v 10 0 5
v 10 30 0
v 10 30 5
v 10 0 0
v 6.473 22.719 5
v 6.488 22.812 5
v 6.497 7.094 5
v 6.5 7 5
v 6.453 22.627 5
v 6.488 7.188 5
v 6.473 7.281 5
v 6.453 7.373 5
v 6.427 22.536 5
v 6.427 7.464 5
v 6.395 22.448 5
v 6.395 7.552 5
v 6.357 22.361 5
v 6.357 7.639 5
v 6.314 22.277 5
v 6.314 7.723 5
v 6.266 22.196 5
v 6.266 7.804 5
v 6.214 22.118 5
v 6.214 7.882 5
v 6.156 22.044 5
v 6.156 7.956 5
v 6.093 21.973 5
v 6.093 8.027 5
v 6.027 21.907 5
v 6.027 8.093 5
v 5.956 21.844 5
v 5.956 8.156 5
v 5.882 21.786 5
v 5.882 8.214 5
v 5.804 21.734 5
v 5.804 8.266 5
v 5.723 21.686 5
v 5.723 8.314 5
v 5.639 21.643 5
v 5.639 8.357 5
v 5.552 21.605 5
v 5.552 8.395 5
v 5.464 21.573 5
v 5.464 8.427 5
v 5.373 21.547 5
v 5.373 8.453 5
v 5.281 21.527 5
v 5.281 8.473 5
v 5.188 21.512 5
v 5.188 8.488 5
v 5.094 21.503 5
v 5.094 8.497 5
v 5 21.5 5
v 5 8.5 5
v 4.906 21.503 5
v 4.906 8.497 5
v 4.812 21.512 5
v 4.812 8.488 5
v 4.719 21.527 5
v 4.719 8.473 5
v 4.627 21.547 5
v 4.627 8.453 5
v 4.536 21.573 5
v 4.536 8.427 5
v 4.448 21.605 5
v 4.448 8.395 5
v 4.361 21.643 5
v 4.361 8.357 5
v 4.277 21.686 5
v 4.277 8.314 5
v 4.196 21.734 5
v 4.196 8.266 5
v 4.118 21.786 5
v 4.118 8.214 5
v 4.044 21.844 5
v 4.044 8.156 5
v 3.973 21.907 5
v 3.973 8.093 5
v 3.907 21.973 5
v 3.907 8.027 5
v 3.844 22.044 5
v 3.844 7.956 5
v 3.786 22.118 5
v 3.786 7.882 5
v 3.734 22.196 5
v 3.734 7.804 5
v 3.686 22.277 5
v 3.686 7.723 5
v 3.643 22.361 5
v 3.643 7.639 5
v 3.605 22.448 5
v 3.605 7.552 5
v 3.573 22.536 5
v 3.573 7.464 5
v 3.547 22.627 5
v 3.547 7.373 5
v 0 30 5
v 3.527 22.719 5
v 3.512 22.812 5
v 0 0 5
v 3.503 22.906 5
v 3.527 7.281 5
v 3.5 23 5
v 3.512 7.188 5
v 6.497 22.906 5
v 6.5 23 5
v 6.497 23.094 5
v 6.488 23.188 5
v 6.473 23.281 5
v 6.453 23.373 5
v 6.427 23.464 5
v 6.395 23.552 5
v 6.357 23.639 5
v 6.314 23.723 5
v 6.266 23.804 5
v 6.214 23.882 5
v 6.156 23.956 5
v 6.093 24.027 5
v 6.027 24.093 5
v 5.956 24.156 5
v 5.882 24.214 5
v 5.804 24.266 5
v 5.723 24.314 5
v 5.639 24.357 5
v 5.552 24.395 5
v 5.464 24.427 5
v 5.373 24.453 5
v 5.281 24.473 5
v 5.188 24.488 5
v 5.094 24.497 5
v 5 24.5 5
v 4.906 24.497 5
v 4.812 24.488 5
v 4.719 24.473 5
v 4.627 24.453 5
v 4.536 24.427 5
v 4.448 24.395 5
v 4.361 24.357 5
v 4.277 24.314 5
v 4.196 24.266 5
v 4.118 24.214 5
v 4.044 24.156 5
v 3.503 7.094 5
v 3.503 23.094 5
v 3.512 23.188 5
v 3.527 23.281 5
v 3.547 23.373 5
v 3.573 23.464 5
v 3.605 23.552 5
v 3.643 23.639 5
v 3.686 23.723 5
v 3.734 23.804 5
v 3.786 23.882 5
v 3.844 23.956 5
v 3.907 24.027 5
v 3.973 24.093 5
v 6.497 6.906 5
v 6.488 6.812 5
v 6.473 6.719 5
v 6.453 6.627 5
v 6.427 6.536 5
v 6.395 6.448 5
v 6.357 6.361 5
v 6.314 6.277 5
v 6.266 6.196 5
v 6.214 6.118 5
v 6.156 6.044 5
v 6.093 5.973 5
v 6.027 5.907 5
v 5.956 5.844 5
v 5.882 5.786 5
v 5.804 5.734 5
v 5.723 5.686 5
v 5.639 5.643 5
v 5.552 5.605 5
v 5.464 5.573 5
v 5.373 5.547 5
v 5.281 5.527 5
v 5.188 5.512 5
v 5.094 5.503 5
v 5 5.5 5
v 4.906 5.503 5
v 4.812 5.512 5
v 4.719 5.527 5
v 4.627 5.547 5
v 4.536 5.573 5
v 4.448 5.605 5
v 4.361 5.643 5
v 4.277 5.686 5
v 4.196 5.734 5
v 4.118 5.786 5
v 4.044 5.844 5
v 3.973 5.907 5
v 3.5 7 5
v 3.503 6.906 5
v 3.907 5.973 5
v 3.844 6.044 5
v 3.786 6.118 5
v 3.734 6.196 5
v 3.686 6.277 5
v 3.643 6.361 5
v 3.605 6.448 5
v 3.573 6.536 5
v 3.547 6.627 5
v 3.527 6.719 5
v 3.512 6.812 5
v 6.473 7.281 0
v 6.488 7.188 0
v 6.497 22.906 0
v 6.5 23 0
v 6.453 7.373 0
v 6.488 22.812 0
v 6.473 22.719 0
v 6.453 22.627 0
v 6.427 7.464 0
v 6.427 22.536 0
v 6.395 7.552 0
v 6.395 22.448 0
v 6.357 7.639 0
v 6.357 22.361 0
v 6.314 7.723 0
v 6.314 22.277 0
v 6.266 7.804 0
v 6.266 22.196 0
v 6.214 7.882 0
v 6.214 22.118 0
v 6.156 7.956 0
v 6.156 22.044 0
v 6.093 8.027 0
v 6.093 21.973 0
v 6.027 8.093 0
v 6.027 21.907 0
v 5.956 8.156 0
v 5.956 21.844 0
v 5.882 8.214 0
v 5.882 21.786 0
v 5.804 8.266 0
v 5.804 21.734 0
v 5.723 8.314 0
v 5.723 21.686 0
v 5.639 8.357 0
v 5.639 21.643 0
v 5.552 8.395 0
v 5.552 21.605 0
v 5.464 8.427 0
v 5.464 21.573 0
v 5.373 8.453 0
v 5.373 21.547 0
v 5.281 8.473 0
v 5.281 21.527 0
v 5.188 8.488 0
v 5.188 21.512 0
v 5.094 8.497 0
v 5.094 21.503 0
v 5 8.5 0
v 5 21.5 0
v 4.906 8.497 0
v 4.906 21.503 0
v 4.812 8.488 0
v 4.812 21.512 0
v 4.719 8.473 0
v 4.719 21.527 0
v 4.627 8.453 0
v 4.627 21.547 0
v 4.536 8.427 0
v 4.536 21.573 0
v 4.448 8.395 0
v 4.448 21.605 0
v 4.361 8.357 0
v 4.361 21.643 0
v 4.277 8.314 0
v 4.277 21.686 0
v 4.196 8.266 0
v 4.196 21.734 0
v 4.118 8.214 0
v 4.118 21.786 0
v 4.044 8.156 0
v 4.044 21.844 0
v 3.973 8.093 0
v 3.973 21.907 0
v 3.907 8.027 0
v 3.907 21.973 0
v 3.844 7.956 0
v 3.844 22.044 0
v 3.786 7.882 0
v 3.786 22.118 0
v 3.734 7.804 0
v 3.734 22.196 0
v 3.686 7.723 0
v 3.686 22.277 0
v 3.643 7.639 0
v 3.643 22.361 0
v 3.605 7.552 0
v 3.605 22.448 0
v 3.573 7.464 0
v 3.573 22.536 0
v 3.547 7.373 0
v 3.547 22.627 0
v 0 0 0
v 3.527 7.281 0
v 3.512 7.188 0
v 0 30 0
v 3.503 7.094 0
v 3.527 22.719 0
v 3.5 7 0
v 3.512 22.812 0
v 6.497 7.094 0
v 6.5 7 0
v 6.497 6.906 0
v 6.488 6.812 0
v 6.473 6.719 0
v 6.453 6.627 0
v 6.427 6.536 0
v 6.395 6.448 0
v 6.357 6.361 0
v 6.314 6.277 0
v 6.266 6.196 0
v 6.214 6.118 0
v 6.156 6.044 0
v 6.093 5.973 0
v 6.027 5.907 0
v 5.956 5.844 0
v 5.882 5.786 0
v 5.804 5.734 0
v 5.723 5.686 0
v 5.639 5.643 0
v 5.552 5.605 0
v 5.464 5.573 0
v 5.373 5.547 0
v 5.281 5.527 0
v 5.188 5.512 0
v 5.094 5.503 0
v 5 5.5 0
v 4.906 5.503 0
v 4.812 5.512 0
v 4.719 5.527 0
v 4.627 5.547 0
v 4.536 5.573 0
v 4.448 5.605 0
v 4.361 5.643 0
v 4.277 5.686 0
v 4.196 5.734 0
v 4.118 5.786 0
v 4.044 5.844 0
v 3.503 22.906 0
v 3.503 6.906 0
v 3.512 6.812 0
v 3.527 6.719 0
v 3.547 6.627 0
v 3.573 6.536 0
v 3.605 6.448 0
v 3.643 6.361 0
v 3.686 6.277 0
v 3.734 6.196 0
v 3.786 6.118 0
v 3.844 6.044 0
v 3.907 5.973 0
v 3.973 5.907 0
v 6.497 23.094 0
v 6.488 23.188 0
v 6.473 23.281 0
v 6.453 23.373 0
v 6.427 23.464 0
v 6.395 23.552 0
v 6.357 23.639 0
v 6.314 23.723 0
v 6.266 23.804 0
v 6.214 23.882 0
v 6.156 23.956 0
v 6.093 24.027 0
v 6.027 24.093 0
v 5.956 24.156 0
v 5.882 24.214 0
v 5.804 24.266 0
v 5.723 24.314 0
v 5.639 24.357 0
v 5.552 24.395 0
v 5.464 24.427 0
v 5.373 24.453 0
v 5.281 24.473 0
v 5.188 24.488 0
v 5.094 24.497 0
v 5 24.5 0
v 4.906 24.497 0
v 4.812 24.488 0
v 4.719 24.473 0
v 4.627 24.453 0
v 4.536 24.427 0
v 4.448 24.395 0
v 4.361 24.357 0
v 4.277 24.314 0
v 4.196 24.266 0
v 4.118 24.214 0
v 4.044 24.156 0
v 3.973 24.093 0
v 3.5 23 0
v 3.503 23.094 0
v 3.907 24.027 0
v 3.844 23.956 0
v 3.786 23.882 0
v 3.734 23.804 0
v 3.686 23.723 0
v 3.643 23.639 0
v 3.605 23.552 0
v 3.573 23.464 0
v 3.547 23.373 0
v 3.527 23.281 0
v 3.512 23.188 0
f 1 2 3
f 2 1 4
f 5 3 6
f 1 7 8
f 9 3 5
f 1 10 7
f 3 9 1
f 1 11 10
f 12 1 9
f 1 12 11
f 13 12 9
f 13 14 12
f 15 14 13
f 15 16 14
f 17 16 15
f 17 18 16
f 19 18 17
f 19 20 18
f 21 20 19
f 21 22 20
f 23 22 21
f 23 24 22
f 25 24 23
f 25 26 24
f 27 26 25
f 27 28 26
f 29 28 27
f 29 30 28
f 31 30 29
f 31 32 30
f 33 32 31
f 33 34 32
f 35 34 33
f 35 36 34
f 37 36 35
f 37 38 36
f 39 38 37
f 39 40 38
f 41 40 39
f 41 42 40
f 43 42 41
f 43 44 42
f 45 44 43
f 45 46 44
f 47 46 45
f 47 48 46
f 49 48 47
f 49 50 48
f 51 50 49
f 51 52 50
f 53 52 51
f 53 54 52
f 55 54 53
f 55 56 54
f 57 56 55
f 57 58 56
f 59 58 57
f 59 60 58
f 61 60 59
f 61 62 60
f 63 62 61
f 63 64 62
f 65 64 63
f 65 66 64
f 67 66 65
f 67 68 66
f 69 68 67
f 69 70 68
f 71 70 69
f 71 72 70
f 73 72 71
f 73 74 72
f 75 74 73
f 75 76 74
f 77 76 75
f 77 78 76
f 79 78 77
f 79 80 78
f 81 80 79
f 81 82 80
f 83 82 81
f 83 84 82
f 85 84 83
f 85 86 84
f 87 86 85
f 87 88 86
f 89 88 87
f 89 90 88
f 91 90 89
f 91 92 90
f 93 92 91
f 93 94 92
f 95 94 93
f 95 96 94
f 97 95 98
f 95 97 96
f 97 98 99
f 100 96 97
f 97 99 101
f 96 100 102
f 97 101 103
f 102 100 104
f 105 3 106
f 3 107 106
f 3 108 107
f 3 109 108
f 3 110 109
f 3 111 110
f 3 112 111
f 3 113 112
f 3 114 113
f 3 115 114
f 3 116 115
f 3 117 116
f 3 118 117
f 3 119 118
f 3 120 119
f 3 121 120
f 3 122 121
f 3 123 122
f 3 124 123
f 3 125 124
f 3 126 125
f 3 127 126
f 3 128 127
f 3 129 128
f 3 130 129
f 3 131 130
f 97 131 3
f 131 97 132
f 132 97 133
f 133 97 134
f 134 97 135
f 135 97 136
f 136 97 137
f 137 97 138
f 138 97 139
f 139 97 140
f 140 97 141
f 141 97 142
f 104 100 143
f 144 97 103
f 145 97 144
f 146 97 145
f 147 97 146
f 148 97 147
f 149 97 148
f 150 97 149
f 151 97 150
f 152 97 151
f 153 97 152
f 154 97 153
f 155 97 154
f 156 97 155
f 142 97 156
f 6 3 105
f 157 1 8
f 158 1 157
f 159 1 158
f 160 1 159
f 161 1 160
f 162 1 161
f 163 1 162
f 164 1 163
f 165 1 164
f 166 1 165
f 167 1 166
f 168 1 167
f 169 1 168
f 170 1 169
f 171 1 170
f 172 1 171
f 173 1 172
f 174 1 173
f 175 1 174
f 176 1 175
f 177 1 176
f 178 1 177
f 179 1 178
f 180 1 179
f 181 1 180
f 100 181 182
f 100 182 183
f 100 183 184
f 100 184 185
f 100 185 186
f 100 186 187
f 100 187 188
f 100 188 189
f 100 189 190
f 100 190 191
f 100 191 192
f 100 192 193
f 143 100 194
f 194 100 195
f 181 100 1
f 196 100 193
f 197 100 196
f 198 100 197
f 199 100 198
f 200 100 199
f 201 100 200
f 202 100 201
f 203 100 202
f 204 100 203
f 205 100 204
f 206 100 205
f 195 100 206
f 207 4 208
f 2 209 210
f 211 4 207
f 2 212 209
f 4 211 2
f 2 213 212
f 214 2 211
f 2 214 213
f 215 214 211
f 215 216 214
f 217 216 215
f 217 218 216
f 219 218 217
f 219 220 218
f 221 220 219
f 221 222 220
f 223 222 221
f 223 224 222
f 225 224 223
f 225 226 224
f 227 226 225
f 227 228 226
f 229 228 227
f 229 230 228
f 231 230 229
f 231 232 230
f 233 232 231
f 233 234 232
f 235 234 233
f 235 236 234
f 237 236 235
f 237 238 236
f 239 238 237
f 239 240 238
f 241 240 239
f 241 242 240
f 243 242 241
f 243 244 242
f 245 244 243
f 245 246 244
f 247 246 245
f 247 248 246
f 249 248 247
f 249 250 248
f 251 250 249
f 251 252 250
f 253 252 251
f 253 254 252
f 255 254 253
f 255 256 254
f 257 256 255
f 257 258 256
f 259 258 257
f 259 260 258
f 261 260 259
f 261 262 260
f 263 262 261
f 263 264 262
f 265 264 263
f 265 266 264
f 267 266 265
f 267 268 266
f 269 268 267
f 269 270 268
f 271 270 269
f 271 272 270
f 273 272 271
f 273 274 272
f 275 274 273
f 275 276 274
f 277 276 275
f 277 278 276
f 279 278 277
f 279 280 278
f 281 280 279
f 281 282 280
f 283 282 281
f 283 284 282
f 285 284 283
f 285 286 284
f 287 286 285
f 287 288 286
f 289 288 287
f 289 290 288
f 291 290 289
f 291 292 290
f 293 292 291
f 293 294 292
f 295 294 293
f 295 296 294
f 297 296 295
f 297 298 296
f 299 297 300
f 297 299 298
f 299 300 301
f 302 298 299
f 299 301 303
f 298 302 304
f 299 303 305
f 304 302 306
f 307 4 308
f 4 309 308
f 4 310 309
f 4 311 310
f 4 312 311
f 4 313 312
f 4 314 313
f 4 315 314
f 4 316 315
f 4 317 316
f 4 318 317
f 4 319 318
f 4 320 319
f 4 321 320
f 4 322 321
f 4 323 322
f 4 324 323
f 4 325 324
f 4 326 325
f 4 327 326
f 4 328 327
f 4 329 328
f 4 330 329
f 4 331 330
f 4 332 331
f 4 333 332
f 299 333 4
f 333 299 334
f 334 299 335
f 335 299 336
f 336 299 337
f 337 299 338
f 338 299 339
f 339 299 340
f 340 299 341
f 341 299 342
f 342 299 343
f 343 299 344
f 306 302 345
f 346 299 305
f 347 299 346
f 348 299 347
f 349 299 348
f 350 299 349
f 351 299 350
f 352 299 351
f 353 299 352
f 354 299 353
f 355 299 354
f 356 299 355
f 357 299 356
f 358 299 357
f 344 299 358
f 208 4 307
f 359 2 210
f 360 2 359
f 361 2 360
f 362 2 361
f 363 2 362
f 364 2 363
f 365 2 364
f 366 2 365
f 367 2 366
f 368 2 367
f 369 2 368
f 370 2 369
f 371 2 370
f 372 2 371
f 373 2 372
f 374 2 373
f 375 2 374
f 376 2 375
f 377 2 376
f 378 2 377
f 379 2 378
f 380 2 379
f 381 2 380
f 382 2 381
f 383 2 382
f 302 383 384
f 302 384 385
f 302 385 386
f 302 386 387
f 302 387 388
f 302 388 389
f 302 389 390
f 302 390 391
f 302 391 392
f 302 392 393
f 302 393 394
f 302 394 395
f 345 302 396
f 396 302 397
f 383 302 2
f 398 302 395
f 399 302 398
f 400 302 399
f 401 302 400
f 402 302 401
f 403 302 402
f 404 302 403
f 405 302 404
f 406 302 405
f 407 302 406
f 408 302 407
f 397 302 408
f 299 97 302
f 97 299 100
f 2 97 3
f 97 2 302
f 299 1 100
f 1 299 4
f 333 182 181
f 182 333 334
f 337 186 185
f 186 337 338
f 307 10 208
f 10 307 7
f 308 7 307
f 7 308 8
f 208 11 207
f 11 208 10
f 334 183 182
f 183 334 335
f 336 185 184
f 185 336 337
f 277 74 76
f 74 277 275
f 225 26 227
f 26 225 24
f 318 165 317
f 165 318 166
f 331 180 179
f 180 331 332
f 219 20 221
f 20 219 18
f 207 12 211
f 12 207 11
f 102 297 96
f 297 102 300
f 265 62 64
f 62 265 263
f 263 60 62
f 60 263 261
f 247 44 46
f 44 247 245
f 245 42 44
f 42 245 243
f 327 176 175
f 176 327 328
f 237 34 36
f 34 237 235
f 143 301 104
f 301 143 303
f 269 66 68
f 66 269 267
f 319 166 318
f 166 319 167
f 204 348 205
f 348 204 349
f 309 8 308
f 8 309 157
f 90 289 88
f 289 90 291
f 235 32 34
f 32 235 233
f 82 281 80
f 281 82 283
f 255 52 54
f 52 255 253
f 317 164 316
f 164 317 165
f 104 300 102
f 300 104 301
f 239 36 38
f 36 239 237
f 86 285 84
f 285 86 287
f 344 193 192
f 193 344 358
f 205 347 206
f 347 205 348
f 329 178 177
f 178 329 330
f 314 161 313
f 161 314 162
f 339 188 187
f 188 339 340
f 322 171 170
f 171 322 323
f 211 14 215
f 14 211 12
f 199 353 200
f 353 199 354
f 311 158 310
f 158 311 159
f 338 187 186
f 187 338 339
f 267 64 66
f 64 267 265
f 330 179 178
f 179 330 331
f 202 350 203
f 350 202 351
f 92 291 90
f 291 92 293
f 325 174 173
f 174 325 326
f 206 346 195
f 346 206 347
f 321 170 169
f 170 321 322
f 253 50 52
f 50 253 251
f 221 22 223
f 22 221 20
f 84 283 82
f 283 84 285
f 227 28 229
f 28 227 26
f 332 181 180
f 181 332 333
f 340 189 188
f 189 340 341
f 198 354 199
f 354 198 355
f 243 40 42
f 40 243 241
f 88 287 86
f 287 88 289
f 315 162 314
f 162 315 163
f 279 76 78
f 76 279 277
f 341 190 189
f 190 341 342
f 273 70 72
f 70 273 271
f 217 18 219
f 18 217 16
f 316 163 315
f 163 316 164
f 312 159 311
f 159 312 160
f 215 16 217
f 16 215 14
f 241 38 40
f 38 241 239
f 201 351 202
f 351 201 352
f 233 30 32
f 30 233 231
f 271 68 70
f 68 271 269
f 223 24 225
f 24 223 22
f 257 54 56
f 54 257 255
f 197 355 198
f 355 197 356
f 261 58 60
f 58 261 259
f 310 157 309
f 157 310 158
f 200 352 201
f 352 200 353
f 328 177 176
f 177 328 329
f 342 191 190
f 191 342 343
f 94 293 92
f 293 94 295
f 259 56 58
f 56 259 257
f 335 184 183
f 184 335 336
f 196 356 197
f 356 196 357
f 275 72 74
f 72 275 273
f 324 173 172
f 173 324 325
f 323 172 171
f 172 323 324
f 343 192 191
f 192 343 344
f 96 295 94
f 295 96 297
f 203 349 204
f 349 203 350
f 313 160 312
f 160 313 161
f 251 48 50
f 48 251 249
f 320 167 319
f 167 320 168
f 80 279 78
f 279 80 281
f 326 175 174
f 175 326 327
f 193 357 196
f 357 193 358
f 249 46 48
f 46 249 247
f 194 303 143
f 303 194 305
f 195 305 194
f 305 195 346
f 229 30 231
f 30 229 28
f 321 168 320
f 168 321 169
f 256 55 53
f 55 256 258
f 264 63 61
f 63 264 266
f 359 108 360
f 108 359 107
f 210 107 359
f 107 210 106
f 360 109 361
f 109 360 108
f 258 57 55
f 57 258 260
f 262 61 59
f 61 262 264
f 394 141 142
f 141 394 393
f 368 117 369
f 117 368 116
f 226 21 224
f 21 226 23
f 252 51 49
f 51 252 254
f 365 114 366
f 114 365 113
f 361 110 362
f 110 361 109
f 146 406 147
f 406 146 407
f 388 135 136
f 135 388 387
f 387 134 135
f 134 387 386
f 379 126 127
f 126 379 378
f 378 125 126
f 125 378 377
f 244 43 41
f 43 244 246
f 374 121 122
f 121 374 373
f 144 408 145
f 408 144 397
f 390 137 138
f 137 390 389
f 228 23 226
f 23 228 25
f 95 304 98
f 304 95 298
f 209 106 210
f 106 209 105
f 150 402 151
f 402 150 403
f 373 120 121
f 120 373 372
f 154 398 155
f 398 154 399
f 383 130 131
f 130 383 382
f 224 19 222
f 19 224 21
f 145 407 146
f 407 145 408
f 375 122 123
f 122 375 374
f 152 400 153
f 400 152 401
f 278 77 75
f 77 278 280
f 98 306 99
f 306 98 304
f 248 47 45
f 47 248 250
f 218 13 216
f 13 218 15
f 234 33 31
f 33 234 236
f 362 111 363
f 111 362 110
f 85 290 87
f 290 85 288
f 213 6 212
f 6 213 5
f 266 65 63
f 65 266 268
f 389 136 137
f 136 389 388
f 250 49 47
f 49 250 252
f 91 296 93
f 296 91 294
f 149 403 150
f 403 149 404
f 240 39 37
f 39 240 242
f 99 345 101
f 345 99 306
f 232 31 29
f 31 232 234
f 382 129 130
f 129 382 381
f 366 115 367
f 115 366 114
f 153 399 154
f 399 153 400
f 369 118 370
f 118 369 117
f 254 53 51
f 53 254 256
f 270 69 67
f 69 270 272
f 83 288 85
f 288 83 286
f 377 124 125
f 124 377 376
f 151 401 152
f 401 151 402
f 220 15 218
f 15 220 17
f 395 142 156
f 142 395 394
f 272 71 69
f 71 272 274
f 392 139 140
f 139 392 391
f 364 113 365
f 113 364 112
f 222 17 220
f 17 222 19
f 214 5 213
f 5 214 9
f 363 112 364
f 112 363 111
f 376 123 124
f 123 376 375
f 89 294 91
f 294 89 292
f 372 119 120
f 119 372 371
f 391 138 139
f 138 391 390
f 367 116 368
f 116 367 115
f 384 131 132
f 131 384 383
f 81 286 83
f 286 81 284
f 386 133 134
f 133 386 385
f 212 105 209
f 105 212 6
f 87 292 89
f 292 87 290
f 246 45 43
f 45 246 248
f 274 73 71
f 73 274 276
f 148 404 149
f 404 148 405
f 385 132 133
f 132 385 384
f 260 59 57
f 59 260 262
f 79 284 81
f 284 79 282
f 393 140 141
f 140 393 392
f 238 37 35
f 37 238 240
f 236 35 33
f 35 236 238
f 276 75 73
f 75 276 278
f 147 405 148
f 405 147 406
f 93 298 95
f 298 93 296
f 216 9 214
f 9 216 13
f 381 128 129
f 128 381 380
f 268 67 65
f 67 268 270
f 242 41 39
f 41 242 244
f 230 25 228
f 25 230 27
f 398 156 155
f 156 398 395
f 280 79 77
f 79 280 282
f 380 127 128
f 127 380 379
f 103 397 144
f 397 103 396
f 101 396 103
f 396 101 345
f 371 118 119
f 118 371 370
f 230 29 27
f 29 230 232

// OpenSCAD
difference(){
cube(size = [10, 30, 5], center = false);
translate([5,7,0])cylinder(d=3,5,h=21,center = true,$fn=100);

translate([5,23,0])cylinder(d=3,5,h=21,center = true,$fn=100);
}
